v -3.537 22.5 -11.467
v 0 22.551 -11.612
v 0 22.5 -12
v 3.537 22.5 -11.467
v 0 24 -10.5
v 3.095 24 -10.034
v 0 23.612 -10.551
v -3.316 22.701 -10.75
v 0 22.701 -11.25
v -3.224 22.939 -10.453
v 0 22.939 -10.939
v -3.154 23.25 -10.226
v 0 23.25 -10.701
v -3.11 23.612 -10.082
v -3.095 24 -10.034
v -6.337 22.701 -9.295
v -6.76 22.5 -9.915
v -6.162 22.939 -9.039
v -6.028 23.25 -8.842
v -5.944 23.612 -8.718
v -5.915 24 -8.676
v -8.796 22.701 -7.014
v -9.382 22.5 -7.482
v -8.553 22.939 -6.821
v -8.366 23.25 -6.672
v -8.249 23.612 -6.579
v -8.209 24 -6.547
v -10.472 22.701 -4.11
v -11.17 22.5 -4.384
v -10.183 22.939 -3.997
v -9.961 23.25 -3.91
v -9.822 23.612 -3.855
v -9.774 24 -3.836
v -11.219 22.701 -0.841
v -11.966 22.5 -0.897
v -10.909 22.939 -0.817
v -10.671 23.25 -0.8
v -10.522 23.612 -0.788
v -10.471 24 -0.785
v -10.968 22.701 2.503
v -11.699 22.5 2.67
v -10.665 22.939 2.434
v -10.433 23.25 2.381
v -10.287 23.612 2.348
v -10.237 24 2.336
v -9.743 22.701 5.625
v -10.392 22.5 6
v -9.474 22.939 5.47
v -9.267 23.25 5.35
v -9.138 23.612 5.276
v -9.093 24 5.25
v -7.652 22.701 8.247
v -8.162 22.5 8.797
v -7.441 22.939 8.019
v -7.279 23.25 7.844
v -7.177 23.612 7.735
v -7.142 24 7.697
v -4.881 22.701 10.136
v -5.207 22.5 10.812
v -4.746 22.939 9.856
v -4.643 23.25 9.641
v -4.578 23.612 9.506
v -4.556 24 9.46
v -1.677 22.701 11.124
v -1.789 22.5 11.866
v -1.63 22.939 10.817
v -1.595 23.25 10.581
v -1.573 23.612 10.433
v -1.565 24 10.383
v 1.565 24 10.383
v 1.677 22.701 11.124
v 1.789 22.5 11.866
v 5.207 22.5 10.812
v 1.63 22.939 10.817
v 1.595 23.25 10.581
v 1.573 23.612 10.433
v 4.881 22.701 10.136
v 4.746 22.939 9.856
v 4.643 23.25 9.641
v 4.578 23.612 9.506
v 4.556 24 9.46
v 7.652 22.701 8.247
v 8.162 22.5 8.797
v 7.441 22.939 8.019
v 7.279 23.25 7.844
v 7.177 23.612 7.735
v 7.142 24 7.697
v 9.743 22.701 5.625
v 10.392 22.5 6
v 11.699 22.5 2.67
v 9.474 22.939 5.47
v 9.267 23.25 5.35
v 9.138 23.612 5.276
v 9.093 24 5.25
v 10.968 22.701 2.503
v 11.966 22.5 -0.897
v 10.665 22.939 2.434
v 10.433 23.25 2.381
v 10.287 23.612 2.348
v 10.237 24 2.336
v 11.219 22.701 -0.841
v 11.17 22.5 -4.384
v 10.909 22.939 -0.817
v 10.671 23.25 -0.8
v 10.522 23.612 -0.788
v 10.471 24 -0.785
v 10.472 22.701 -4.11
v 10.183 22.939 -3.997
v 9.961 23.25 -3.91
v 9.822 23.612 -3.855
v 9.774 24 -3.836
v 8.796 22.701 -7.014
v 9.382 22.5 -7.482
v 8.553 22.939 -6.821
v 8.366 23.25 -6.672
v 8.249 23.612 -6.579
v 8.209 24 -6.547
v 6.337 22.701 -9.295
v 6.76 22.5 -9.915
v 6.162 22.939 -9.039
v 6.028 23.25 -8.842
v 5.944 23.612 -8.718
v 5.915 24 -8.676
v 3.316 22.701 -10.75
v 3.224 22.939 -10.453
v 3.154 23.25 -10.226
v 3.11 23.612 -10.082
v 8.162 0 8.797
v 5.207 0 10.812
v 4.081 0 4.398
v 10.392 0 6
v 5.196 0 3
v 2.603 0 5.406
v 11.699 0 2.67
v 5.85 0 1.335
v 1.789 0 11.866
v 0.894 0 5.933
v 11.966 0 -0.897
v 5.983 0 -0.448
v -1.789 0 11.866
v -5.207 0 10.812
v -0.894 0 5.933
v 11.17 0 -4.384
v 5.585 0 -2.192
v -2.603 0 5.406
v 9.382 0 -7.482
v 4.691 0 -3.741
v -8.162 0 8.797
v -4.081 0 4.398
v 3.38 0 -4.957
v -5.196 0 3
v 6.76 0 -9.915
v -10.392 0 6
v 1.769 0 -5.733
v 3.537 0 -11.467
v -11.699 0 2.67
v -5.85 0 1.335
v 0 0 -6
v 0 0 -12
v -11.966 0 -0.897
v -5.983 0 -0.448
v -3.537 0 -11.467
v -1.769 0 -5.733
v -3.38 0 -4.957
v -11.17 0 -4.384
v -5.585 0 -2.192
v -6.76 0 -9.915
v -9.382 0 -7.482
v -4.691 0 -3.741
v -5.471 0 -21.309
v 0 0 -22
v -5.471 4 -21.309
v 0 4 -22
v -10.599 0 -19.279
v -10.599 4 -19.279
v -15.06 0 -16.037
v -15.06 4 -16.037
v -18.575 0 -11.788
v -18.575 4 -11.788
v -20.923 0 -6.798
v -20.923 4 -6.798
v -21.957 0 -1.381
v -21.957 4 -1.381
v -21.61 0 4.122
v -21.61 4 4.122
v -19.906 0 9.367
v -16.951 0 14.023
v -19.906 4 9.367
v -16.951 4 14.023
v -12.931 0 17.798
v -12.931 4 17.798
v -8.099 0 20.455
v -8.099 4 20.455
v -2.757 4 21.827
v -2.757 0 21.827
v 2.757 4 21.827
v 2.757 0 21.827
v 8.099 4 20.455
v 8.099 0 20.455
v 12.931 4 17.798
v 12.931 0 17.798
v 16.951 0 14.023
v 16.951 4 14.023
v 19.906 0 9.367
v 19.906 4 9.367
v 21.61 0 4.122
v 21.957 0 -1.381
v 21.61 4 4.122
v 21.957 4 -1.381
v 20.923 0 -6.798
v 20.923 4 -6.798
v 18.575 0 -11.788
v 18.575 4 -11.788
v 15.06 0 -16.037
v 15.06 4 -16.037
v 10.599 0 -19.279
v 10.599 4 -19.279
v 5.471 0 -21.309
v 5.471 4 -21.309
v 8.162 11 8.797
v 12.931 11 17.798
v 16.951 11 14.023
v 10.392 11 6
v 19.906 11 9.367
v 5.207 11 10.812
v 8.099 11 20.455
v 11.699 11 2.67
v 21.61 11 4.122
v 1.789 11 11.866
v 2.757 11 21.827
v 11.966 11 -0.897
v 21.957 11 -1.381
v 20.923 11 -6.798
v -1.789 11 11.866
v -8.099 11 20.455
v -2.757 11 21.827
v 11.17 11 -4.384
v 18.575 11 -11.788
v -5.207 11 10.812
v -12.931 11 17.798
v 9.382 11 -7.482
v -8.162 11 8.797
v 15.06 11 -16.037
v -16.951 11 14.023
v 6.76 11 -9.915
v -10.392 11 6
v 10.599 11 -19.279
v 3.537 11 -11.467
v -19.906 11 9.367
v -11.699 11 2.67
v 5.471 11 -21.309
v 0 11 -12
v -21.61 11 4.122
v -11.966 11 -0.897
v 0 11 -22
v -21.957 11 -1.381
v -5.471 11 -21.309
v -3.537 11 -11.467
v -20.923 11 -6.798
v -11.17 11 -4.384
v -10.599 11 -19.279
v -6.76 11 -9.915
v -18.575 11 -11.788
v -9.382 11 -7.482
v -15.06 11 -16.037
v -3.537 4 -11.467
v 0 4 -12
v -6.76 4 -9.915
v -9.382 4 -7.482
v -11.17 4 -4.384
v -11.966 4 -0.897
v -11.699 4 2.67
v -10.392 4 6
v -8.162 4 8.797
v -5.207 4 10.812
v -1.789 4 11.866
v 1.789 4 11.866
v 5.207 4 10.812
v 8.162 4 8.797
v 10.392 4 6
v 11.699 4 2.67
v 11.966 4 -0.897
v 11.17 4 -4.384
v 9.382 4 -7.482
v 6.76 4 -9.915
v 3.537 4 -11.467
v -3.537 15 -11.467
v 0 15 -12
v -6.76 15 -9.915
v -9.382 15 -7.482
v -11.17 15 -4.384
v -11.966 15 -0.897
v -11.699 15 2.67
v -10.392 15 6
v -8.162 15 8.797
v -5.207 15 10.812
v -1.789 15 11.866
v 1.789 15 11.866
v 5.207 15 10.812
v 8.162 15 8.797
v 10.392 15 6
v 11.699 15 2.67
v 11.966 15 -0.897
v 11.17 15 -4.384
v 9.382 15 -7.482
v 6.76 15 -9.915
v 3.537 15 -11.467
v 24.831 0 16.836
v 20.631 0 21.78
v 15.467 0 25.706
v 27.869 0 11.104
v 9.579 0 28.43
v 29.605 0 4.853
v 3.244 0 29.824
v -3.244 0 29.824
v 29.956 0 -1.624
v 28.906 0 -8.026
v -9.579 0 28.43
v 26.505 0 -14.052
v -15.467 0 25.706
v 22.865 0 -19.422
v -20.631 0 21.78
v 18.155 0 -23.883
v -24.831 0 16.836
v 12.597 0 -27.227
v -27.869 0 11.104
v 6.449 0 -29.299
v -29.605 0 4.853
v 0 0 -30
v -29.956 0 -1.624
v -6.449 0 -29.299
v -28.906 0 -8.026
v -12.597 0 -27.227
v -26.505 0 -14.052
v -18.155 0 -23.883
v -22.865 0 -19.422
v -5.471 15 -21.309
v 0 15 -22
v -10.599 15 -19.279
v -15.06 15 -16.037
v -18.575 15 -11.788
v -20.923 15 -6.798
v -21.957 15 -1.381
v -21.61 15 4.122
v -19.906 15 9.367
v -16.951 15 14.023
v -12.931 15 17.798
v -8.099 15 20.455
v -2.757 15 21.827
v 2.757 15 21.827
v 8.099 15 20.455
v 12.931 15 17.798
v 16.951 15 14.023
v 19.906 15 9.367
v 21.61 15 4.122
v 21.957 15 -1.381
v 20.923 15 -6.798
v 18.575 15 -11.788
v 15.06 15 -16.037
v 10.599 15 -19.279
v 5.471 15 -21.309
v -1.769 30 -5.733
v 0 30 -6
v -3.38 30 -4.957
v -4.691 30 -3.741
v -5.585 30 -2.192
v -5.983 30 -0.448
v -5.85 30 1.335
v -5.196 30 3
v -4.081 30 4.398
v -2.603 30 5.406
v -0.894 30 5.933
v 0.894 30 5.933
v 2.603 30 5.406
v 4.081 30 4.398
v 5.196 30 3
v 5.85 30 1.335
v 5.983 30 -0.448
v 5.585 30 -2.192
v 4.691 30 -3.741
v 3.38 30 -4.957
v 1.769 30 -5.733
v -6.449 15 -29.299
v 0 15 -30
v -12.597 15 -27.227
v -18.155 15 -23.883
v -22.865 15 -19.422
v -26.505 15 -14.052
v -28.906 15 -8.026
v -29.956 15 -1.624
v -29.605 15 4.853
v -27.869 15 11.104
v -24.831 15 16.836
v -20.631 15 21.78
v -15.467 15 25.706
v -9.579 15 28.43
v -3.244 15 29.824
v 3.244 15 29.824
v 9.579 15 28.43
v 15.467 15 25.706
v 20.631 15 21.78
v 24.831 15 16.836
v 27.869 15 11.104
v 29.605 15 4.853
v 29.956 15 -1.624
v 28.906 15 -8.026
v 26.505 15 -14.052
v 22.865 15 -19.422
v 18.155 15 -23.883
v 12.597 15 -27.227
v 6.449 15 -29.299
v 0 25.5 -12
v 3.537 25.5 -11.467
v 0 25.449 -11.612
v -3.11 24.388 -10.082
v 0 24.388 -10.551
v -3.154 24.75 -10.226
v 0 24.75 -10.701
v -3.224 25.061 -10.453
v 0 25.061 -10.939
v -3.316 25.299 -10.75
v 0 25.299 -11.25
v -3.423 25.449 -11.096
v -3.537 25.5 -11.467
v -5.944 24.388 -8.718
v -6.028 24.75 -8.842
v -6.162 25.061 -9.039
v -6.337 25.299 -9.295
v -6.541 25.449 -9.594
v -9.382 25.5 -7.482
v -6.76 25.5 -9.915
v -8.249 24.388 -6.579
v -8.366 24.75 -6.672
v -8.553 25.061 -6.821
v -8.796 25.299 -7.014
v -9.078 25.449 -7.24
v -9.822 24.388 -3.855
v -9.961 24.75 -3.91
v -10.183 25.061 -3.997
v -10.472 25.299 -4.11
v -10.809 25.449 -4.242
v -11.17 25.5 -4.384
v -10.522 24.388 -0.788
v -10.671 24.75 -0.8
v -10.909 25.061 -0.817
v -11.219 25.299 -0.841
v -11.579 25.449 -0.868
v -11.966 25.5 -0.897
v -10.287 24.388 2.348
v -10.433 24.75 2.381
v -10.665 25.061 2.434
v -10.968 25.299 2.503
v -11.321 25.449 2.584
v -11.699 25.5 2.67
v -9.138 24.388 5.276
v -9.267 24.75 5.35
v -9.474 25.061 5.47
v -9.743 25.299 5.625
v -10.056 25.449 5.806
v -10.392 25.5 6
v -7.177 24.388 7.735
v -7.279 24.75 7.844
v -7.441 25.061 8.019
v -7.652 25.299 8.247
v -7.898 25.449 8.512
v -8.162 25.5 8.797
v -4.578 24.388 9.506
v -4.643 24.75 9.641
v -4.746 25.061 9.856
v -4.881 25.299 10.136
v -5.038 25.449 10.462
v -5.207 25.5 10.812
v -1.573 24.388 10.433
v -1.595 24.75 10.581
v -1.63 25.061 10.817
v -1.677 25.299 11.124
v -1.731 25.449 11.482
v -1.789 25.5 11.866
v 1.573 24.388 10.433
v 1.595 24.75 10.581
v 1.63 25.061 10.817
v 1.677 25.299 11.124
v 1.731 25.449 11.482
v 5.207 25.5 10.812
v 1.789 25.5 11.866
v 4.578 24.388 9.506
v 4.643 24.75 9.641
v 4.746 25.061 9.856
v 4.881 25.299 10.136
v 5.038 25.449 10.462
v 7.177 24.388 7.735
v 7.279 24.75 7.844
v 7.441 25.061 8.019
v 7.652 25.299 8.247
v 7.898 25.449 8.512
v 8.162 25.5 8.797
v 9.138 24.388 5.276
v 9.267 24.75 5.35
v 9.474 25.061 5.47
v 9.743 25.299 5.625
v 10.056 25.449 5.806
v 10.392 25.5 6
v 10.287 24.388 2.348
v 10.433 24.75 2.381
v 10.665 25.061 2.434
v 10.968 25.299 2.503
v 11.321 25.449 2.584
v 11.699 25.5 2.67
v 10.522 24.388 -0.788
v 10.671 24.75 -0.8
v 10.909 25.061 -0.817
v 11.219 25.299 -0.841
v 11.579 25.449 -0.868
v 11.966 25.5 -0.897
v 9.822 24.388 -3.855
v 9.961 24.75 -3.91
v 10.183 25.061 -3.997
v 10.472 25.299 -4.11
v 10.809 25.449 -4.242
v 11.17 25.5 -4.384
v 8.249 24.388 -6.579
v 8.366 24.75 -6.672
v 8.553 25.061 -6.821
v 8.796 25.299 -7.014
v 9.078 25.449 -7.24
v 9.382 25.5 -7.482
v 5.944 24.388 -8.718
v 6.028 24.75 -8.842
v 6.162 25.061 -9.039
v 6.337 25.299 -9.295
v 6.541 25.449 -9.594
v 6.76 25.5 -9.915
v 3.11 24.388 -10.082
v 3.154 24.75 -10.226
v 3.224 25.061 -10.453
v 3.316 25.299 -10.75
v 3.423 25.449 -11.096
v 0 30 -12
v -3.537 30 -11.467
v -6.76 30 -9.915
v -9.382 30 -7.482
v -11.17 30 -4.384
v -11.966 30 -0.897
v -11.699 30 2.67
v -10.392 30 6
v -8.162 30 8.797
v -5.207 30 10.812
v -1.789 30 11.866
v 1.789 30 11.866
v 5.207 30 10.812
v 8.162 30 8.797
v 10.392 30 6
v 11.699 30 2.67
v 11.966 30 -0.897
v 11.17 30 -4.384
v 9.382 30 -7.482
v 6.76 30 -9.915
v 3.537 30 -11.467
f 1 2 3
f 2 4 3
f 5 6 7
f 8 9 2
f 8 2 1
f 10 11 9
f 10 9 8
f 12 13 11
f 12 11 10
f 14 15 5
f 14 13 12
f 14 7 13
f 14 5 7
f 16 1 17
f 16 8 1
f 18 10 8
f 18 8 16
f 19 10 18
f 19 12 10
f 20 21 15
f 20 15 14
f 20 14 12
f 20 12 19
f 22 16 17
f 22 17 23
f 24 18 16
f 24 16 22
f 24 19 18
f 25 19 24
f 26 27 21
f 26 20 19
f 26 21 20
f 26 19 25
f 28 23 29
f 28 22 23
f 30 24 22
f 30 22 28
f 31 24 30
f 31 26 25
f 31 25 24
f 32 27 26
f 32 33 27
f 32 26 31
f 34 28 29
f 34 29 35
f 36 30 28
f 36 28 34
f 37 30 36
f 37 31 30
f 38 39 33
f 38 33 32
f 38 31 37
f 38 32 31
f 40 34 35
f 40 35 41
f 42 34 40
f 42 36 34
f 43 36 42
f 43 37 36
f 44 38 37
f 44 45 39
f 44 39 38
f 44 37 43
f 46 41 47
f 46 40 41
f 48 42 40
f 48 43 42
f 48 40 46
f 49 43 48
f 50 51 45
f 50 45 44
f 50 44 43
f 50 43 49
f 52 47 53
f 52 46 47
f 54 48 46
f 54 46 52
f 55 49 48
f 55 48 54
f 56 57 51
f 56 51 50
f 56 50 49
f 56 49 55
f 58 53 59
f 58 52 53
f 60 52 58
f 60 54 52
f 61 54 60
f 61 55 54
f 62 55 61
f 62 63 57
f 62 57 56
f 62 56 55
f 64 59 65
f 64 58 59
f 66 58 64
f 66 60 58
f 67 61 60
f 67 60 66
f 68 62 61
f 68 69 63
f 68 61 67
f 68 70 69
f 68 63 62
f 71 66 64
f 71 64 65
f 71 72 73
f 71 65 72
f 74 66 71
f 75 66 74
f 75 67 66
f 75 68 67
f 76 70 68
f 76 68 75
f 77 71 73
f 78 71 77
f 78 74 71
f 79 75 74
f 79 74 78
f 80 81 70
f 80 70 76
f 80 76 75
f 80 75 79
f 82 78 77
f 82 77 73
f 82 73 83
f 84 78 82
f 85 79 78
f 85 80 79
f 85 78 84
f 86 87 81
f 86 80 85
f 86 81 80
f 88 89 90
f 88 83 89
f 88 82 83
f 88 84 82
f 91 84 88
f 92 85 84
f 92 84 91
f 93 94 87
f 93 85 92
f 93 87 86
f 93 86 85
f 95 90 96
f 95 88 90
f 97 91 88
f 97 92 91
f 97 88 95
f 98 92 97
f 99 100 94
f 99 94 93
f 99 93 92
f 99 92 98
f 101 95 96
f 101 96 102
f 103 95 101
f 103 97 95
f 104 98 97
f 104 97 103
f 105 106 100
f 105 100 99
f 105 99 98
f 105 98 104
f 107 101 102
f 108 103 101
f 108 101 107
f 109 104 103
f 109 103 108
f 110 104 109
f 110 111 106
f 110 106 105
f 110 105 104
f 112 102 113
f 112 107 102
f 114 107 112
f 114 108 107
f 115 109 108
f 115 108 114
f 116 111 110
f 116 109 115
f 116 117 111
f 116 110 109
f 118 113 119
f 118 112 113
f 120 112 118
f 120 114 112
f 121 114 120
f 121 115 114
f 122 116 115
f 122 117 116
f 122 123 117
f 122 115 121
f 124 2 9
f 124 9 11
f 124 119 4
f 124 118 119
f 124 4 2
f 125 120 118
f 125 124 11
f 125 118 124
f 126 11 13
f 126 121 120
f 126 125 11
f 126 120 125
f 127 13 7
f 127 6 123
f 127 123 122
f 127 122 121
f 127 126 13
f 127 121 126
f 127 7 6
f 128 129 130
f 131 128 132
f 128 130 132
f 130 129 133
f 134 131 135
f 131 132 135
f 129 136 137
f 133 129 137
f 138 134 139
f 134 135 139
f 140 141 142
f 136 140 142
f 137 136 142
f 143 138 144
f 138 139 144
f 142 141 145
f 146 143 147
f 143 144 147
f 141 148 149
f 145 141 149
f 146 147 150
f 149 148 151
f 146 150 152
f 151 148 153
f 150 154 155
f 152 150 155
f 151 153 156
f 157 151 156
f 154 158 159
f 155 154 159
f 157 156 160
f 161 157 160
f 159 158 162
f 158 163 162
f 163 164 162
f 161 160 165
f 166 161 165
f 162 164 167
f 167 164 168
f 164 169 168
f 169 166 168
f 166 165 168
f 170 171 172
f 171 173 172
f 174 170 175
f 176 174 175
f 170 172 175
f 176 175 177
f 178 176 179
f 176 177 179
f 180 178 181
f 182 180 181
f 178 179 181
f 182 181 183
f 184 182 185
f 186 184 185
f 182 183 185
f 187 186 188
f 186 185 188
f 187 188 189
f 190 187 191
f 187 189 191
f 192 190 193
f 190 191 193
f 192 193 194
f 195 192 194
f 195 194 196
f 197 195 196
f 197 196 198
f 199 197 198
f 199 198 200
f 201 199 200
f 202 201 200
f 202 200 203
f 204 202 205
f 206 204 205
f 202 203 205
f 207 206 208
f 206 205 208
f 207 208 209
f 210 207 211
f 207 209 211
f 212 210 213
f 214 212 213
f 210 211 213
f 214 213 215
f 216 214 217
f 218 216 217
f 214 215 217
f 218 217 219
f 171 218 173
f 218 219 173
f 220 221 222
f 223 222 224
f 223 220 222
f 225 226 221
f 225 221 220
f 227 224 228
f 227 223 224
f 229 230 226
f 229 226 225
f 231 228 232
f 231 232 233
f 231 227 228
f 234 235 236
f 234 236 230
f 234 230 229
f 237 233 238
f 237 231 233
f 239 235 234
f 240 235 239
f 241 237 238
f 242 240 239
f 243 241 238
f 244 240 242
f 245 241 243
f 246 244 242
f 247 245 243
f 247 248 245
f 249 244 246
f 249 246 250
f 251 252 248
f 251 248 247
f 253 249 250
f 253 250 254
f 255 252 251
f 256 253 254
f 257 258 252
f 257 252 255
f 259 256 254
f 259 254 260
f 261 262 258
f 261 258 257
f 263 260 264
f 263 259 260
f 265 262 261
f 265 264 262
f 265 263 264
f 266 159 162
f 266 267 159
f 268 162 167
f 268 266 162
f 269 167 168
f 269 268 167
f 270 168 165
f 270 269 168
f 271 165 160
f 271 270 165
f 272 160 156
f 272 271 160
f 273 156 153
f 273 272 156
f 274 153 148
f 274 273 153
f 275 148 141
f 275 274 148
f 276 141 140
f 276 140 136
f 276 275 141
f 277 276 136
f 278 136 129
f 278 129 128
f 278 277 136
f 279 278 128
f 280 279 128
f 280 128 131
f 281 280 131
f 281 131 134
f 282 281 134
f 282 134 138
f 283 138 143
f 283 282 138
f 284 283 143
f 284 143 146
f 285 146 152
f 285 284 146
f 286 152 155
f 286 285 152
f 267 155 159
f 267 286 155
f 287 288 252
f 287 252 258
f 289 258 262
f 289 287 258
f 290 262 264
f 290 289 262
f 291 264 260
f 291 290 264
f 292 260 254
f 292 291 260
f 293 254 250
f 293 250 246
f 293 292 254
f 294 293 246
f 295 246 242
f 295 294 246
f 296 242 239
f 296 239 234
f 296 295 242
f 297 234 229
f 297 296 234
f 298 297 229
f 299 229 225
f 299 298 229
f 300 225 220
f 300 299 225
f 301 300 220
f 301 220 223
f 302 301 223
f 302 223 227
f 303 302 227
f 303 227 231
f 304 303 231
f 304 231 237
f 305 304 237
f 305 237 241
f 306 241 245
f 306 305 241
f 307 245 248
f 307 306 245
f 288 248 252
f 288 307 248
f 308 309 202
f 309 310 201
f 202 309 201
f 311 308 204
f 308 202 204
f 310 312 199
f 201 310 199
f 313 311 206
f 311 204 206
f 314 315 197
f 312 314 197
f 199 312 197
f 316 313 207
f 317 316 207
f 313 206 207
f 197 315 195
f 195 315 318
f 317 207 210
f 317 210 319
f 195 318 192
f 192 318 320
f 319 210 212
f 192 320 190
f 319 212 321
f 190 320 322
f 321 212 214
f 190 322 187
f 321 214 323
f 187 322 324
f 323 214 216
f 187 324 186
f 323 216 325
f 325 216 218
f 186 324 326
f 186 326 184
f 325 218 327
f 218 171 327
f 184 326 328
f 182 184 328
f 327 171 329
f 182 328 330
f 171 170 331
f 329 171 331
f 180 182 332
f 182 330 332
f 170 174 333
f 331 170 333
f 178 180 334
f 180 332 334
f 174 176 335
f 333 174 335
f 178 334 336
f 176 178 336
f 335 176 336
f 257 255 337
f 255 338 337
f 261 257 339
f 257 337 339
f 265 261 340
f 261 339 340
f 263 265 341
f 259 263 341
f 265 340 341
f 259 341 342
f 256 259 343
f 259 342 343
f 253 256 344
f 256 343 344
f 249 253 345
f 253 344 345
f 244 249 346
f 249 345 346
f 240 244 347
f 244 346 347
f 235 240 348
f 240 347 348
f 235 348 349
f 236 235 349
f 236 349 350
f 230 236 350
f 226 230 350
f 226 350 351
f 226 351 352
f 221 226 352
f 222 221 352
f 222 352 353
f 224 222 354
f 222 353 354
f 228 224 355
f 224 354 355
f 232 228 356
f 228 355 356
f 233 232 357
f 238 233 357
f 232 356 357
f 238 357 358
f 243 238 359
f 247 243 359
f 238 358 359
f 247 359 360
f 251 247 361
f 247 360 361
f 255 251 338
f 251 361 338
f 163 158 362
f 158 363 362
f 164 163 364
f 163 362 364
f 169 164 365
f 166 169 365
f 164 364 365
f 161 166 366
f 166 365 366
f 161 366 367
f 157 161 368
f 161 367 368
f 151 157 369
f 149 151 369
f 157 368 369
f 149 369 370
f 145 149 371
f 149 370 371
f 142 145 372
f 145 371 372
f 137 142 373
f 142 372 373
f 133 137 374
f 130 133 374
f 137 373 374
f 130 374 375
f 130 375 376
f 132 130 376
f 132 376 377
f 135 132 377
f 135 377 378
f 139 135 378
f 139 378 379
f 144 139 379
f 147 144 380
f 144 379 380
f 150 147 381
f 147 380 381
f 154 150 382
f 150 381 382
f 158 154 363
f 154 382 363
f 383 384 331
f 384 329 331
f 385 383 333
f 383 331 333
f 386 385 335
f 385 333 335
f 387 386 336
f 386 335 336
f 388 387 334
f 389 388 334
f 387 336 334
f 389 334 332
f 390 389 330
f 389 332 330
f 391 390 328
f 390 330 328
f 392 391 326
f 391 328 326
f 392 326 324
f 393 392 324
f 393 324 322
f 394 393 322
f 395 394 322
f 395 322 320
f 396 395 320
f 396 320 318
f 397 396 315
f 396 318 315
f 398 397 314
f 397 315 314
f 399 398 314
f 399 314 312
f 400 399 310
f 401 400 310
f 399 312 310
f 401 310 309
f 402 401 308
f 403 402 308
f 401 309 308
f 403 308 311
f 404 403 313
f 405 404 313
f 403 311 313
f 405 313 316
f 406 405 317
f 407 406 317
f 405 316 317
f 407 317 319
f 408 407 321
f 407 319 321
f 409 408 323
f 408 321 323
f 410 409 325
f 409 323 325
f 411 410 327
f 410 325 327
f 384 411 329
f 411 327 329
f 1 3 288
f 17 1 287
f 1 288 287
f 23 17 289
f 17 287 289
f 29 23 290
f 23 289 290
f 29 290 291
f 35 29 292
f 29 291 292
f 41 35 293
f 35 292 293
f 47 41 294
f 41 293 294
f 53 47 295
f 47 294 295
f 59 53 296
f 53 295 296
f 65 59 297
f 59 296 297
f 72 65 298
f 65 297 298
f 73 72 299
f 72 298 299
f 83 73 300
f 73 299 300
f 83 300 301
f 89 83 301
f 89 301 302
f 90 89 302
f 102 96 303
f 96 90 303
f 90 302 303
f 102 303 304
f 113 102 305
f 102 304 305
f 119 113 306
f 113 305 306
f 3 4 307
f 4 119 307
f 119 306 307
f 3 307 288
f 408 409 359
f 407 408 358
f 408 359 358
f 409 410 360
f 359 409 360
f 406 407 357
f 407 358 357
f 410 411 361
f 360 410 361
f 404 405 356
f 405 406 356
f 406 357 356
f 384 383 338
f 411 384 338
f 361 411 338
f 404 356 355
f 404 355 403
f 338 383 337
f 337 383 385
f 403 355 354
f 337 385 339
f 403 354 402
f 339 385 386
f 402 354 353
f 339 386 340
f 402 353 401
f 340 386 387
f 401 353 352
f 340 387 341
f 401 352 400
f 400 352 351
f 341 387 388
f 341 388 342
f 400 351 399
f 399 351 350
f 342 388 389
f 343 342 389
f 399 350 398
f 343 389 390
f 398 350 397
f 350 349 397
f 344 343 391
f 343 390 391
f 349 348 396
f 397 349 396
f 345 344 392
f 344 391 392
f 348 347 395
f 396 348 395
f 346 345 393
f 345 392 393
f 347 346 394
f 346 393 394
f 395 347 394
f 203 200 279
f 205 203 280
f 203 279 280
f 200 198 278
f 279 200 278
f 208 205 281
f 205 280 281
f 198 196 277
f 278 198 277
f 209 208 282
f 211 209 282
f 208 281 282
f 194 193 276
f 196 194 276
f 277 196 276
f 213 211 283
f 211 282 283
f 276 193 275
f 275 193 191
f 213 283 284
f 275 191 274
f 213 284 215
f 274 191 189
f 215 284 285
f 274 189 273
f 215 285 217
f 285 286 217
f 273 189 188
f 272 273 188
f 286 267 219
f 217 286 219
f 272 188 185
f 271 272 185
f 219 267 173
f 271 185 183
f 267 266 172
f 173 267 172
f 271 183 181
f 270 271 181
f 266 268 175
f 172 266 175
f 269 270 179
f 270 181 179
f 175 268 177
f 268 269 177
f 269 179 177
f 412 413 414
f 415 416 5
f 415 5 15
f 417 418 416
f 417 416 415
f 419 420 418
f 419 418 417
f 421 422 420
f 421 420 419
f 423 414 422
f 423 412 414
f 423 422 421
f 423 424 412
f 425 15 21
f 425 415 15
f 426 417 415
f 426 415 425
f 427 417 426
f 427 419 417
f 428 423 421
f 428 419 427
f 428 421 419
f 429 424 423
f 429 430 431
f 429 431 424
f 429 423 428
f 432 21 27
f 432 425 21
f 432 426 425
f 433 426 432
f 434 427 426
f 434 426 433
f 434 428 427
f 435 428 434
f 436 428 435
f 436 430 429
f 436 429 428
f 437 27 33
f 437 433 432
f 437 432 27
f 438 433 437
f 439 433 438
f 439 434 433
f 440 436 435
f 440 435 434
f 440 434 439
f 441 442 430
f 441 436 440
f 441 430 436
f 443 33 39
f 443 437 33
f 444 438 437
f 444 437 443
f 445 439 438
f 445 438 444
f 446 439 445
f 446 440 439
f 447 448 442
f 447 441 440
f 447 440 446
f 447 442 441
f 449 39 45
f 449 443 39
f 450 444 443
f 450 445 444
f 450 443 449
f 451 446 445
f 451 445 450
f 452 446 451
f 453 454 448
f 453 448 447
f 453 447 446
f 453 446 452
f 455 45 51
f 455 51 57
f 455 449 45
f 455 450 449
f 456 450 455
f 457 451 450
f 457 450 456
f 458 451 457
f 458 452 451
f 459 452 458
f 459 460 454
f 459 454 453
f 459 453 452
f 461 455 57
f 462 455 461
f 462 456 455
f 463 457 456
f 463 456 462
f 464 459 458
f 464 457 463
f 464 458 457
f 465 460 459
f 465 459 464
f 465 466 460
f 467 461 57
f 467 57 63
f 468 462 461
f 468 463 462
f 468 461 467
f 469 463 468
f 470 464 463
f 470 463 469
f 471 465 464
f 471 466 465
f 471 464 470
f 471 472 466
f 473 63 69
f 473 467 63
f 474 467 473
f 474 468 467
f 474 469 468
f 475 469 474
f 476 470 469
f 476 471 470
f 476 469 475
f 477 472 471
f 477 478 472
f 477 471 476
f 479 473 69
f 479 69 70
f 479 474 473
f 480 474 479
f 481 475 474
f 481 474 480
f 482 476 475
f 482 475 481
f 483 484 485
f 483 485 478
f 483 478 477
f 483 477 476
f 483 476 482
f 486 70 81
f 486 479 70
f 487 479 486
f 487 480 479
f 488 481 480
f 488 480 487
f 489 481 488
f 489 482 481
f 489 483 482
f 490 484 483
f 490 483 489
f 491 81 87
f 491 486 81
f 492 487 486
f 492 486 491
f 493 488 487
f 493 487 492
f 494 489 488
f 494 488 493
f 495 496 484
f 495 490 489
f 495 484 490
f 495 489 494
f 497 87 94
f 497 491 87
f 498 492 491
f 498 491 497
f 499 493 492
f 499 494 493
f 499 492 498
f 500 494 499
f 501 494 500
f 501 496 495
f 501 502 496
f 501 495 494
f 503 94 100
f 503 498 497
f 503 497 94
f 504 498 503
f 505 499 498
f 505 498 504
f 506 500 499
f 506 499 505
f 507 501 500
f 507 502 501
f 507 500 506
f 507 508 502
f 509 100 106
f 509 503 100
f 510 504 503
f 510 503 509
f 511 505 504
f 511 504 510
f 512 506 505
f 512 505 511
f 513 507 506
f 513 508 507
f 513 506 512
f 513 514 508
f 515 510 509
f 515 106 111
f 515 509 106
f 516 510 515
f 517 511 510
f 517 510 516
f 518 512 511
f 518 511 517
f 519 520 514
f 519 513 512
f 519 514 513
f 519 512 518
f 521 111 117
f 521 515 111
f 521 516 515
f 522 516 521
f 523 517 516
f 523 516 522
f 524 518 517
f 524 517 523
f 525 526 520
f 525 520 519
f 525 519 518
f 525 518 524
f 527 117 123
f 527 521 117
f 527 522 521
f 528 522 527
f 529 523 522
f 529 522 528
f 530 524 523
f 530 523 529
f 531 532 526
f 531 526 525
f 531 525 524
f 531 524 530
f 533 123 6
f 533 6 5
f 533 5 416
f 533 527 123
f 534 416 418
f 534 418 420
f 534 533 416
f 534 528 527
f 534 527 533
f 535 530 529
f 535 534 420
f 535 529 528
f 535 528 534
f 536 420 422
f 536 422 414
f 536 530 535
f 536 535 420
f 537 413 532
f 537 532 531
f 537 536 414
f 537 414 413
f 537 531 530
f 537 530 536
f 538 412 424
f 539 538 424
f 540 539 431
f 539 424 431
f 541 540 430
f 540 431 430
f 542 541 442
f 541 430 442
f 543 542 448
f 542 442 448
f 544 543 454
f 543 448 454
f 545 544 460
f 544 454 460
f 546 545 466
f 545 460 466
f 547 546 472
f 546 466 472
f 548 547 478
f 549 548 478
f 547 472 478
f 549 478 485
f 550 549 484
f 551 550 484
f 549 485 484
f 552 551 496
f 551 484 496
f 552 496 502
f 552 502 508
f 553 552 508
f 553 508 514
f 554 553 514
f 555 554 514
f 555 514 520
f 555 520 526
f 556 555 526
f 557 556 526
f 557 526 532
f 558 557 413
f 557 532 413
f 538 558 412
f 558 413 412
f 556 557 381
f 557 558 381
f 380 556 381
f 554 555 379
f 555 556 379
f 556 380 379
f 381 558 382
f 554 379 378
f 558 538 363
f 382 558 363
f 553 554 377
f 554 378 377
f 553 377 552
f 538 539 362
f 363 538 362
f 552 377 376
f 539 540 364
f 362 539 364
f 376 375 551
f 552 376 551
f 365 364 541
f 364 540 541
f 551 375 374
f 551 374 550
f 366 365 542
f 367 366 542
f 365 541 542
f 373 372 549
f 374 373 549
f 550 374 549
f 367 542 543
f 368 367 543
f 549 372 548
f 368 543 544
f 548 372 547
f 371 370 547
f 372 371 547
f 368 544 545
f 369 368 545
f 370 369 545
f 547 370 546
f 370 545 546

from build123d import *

# Parameters (mm, degrees)
SKETCH_2_R = 1.5
SKETCH_2_W = 10
SKETCH_2_H = 4


with BuildPart() as part:
    # 草图1 → 旋转1 (revolve)
    with BuildSketch(Plane.XY, mode=Mode.PRIVATE) as revolve_1_sk:
        Polygon((-12, 30), (-12, 15), (-30, 15), (-30, 0), (-6, 0), (-6, 30), align=None)
    revolve(revolve_1_sk.sketch.rotate(Axis((0, -28.507704651, 0), (0, 1, 0)), 270), axis=Axis((0, -28.507704651, 0), (0, 1, 0)))

    # 草图2 → 切除-旋转1 (revolve, cut)
    with BuildSketch(Plane.XY, mode=Mode.PRIVATE) as cut_revolve_1_sk:
        with Locations((-12, 24)):
            Circle(SKETCH_2_R)
        with Locations((-17, 13)):
            Rectangle(SKETCH_2_W, SKETCH_2_H)
        with Locations((-17, 2)):
            Rectangle(SKETCH_2_W, SKETCH_2_H)
    revolve(cut_revolve_1_sk.sketch.rotate(Axis((0, 0, 0), (0, 1, 0)), 270), axis=Axis((0, 0, 0), (0, 1, 0)), mode=Mode.SUBTRACT)


solid = part.part
